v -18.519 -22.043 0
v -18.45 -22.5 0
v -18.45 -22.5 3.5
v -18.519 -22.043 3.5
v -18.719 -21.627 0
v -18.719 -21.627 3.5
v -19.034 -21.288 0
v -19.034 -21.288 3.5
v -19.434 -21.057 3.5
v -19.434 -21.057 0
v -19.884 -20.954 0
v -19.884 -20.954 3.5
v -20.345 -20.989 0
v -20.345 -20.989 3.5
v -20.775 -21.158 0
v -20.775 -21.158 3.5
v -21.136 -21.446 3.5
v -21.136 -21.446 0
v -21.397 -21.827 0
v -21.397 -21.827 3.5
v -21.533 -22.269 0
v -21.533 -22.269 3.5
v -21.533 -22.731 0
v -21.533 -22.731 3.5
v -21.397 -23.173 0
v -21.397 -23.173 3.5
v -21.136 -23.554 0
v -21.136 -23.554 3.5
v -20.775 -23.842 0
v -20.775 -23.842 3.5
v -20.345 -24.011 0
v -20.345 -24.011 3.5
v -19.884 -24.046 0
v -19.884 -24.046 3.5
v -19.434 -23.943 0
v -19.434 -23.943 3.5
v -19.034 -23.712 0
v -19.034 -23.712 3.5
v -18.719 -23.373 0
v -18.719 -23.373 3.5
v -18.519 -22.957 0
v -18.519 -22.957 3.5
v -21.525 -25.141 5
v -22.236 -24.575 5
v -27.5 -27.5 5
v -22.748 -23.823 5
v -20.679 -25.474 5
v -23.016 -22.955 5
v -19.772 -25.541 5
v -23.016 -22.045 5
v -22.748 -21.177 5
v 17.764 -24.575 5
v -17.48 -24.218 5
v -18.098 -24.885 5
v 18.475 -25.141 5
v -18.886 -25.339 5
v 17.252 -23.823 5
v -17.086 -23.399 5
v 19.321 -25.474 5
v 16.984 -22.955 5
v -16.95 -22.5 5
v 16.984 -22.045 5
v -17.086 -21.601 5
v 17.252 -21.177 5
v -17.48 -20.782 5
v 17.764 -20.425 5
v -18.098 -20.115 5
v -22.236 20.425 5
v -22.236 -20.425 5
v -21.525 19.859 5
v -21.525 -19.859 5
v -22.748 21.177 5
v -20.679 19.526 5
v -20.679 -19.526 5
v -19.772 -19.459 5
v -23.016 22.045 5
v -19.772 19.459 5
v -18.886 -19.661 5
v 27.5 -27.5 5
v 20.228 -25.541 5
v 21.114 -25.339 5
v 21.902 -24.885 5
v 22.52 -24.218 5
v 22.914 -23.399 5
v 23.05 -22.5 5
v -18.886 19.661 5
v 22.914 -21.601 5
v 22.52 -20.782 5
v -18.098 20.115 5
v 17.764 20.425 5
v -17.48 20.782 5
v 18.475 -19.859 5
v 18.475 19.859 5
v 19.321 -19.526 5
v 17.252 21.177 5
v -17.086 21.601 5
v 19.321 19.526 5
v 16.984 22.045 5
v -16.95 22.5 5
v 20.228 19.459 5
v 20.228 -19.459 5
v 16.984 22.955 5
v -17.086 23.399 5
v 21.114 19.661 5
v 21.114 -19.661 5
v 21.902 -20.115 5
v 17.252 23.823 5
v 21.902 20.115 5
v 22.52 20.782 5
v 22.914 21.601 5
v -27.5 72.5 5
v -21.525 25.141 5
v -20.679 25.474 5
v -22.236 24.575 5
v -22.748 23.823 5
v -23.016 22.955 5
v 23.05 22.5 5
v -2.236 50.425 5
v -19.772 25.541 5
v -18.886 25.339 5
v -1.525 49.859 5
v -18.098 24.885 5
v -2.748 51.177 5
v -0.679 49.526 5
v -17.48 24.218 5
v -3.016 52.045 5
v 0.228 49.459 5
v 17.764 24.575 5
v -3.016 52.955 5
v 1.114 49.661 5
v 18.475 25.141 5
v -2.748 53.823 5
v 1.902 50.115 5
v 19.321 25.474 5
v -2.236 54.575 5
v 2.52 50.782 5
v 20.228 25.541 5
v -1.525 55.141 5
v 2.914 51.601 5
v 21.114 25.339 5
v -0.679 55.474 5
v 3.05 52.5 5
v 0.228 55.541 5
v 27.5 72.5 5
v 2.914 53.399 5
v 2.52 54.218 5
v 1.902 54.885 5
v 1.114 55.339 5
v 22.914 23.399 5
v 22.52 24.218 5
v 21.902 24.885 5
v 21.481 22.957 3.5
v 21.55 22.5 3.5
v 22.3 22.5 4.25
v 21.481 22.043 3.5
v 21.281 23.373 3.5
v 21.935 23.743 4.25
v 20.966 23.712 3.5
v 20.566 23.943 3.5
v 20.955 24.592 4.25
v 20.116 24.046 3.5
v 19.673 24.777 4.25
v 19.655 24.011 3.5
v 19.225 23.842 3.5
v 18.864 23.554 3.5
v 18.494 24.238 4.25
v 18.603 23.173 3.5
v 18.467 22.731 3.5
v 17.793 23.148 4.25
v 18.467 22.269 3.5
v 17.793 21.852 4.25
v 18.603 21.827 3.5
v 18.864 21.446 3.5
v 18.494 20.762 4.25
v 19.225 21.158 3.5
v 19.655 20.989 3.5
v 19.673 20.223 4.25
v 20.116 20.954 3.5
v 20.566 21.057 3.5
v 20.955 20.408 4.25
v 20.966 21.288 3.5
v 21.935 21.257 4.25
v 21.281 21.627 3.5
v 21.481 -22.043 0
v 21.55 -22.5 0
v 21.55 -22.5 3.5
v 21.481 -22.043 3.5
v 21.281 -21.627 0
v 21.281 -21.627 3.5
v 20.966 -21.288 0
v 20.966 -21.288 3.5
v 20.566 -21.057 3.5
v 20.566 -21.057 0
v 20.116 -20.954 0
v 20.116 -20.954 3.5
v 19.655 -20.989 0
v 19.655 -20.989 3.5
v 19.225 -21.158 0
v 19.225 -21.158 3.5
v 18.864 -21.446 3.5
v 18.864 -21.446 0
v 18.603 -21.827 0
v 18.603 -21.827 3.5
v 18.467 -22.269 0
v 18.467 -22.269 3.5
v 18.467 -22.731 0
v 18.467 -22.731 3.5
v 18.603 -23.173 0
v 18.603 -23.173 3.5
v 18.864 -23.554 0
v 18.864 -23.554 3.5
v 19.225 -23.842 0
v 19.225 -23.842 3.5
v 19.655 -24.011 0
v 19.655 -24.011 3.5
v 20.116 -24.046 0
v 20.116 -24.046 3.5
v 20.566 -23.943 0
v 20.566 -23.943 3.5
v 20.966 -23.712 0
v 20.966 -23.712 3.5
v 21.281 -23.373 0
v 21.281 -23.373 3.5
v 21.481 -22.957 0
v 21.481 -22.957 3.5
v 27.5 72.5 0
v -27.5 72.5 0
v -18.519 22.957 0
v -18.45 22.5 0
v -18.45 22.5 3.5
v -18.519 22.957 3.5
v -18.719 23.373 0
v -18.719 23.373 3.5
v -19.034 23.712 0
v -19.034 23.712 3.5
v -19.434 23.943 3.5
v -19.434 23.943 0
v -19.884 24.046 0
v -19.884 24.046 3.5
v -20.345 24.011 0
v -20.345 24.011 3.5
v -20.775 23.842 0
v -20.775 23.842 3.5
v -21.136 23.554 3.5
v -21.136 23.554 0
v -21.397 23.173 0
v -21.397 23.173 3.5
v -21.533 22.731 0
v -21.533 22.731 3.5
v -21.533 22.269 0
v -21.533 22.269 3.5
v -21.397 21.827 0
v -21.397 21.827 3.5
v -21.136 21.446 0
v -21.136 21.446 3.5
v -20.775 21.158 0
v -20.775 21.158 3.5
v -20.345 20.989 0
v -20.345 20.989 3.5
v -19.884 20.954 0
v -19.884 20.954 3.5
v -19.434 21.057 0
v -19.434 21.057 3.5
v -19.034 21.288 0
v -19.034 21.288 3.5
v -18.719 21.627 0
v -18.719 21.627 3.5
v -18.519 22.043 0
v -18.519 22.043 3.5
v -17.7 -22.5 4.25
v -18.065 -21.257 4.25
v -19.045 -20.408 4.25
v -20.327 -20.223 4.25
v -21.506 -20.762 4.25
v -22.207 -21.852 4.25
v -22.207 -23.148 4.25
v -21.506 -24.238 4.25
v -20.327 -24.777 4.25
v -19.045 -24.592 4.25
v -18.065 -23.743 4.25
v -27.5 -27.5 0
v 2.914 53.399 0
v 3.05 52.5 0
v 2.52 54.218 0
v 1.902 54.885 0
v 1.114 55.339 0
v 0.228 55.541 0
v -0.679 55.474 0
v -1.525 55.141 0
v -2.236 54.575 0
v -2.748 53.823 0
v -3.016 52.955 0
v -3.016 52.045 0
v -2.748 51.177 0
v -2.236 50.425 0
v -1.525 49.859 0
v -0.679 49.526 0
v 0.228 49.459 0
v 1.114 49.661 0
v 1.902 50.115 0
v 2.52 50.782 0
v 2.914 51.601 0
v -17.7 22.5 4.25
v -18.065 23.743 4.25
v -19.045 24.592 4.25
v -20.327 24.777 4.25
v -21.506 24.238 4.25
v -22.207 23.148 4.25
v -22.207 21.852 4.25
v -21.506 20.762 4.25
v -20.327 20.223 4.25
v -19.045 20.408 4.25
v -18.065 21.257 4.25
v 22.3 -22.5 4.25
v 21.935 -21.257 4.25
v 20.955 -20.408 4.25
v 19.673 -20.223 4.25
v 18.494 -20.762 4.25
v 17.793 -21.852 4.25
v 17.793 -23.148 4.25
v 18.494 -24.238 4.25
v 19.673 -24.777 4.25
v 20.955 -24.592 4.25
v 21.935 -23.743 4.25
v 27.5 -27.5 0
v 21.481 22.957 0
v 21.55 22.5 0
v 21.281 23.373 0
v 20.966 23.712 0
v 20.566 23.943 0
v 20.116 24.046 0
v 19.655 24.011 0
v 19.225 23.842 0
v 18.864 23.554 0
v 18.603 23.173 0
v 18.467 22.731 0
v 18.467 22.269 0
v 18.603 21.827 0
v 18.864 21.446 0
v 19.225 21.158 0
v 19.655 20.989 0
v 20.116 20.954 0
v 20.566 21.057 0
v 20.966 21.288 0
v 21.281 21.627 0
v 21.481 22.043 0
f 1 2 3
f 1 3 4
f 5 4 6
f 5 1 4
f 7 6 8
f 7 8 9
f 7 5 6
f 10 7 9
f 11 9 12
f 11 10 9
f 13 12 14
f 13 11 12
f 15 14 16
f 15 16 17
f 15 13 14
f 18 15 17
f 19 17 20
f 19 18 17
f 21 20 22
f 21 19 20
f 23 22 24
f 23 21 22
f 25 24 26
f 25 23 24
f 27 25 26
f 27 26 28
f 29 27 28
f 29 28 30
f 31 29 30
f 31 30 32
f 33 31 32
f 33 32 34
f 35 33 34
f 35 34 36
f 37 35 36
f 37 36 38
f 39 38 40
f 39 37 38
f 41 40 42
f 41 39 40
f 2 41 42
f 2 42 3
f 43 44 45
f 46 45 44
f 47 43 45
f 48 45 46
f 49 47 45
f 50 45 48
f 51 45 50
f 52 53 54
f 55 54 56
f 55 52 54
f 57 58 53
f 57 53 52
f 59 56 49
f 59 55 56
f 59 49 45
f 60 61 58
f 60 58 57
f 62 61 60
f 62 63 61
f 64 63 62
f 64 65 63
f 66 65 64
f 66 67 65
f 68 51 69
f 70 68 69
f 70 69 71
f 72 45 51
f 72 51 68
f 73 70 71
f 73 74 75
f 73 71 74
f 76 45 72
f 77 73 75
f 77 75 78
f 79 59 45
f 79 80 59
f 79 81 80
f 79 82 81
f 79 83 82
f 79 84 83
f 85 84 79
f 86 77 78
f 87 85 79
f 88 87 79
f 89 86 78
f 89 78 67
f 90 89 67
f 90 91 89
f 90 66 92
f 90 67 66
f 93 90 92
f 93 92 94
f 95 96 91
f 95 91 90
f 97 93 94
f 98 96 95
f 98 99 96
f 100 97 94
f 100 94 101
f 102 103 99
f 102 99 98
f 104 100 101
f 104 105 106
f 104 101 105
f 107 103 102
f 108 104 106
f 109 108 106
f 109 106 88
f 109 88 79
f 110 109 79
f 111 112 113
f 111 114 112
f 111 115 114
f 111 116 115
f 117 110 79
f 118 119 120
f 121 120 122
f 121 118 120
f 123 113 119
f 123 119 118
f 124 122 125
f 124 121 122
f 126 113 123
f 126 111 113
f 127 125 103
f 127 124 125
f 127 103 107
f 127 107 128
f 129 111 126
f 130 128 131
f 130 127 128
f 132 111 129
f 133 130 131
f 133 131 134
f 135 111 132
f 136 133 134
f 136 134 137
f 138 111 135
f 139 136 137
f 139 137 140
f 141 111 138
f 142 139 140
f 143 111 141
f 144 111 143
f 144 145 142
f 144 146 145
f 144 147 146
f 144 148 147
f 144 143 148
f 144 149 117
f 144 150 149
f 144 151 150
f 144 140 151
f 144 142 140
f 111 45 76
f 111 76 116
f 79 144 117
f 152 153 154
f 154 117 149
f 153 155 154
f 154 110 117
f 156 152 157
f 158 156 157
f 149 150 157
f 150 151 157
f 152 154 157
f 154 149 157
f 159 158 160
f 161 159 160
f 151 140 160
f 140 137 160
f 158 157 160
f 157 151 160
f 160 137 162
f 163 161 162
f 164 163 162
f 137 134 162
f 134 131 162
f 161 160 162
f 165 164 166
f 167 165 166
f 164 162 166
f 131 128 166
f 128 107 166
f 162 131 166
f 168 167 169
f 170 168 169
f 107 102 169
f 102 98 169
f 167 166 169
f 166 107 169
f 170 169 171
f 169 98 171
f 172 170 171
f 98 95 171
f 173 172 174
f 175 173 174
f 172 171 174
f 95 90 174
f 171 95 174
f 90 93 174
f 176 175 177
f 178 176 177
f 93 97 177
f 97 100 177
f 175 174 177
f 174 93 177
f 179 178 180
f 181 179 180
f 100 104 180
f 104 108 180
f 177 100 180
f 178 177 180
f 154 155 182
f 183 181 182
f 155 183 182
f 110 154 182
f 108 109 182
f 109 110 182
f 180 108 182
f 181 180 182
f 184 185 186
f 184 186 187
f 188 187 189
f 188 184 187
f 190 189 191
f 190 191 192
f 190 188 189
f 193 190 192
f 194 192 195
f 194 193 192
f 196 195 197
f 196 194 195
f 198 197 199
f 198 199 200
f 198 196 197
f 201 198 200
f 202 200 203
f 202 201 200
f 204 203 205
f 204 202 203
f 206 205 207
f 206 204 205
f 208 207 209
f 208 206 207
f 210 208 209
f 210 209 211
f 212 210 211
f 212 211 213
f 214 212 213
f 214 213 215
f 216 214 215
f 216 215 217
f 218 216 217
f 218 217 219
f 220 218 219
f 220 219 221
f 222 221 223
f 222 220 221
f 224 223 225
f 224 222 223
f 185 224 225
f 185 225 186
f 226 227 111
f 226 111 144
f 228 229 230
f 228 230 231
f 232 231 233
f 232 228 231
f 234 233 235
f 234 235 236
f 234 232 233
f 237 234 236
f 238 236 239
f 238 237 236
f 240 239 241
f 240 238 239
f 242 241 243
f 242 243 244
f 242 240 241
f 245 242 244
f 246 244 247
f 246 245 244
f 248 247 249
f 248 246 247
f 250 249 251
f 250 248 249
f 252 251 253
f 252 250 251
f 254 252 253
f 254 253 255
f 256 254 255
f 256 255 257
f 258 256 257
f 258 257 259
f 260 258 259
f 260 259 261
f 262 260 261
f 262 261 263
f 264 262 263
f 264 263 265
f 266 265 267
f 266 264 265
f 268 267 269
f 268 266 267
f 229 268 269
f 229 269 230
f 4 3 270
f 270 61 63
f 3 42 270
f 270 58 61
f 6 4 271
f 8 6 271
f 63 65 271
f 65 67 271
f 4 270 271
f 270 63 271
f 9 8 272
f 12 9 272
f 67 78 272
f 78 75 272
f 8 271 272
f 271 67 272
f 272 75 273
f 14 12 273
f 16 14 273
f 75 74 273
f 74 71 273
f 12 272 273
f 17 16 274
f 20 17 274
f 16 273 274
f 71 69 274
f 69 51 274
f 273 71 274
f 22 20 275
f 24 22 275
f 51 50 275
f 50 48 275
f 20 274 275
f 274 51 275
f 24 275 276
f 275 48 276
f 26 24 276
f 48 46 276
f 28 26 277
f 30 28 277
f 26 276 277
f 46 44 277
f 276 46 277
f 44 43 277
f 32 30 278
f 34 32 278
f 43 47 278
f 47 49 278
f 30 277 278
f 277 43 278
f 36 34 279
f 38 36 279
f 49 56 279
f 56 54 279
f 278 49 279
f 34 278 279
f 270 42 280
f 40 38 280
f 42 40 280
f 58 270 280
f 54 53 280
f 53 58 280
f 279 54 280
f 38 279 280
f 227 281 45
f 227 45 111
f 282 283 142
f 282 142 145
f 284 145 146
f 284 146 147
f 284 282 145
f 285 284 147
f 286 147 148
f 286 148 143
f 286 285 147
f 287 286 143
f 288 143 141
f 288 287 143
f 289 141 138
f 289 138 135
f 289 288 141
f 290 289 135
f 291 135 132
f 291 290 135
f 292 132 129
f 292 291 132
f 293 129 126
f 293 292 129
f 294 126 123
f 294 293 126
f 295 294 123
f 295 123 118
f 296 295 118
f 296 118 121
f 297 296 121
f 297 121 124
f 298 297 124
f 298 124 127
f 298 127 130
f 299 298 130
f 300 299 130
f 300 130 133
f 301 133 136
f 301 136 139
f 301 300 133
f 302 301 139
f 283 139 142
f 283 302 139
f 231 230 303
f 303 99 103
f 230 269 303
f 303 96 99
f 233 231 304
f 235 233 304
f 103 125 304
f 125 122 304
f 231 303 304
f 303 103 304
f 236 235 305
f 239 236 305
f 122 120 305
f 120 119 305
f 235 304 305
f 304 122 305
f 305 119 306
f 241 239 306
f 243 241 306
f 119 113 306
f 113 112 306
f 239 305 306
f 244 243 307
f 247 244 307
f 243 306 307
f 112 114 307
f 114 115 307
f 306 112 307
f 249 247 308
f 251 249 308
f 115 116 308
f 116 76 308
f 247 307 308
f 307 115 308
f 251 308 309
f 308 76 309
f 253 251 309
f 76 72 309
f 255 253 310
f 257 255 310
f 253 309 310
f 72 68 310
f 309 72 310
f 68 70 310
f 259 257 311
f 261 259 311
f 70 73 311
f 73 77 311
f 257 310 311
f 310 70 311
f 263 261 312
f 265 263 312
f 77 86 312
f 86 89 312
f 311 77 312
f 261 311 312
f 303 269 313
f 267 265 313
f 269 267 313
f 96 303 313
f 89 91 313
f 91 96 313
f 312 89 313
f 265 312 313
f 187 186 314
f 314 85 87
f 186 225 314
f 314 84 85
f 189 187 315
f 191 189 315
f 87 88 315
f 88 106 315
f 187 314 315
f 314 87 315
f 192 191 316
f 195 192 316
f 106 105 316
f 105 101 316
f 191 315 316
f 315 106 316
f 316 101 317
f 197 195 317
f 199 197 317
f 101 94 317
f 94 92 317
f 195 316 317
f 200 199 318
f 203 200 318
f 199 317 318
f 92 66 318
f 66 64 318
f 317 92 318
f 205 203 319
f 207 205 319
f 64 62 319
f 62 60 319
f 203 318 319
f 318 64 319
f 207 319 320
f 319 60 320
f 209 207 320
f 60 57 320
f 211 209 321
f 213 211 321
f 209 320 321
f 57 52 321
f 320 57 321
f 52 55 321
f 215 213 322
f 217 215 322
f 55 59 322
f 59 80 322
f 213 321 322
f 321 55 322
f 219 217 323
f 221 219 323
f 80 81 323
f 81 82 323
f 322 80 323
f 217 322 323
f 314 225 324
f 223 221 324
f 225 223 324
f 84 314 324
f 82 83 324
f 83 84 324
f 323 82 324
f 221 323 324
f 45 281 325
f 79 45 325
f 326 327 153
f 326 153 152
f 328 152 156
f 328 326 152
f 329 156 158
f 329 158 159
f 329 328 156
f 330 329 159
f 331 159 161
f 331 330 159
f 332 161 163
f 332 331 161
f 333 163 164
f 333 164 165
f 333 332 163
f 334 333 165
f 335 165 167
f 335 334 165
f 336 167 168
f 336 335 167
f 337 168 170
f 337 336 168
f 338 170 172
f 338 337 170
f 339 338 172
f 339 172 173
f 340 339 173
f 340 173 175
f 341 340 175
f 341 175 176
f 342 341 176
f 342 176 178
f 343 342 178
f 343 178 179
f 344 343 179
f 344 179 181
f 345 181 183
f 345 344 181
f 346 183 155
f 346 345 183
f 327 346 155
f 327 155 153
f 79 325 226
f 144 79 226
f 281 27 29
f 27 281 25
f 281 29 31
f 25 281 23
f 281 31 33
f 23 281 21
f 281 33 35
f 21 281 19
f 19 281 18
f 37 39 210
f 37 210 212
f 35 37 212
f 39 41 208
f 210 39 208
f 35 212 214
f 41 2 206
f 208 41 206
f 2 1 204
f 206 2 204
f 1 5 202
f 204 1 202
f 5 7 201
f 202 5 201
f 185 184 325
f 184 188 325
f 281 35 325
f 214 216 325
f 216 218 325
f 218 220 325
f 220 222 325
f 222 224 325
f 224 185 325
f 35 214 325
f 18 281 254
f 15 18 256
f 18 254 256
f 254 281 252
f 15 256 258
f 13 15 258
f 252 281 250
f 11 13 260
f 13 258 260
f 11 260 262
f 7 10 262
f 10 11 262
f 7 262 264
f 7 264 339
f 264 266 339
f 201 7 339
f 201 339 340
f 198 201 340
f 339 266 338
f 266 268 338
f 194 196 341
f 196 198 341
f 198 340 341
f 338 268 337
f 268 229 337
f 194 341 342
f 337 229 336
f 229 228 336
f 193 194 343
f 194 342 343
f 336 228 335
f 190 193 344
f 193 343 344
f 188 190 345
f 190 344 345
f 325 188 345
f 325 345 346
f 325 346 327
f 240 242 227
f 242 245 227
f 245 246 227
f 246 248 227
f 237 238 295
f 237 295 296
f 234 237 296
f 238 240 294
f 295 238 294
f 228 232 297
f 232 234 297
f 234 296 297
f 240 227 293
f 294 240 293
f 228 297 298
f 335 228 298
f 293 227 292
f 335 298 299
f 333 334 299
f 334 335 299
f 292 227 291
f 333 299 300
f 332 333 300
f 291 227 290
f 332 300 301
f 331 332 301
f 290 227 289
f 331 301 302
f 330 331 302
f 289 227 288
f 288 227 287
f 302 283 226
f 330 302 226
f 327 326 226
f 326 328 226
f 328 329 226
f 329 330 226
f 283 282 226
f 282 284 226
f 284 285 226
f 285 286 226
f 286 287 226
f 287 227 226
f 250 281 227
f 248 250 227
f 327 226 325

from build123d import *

# Parameters (mm, degrees)
F0_W     = 55
F0_H     = 100
F0_R     = 1.55
F0_R_2   = 3.05
F1_DEPTH = 5
F2_SIZE  = 1.5


with BuildPart() as f1:
    # F0 (on Top) → F1 (new body)
    with BuildSketch(Plane.XY):
        with Locations((0, 22.5)):
            Rectangle(F0_W, F0_H)
        with Locations((-20, -22.5)):
            Circle(F0_R, mode=Mode.SUBTRACT)
        with Locations((20, -22.5)):
            Circle(F0_R, mode=Mode.SUBTRACT)
        with Locations((-20, 22.5)):
            Circle(F0_R, mode=Mode.SUBTRACT)
        with Locations((20, 22.5)):
            Circle(F0_R, mode=Mode.SUBTRACT)
        with Locations((0, 52.5)):
            Circle(F0_R_2, mode=Mode.SUBTRACT)
    extrude(amount=F1_DEPTH)

    # F2
    f2_edges = [f1.edges().sort_by_distance(p)[0] for p in [
        (-21.55, 22.5, 5),
        (18.45, 22.5, 5),
        (18.45, -22.5, 5),
        (-21.55, -22.5, 5),
    ]]
    chamfer(f2_edges, length=F2_SIZE)


solid = f1.part
